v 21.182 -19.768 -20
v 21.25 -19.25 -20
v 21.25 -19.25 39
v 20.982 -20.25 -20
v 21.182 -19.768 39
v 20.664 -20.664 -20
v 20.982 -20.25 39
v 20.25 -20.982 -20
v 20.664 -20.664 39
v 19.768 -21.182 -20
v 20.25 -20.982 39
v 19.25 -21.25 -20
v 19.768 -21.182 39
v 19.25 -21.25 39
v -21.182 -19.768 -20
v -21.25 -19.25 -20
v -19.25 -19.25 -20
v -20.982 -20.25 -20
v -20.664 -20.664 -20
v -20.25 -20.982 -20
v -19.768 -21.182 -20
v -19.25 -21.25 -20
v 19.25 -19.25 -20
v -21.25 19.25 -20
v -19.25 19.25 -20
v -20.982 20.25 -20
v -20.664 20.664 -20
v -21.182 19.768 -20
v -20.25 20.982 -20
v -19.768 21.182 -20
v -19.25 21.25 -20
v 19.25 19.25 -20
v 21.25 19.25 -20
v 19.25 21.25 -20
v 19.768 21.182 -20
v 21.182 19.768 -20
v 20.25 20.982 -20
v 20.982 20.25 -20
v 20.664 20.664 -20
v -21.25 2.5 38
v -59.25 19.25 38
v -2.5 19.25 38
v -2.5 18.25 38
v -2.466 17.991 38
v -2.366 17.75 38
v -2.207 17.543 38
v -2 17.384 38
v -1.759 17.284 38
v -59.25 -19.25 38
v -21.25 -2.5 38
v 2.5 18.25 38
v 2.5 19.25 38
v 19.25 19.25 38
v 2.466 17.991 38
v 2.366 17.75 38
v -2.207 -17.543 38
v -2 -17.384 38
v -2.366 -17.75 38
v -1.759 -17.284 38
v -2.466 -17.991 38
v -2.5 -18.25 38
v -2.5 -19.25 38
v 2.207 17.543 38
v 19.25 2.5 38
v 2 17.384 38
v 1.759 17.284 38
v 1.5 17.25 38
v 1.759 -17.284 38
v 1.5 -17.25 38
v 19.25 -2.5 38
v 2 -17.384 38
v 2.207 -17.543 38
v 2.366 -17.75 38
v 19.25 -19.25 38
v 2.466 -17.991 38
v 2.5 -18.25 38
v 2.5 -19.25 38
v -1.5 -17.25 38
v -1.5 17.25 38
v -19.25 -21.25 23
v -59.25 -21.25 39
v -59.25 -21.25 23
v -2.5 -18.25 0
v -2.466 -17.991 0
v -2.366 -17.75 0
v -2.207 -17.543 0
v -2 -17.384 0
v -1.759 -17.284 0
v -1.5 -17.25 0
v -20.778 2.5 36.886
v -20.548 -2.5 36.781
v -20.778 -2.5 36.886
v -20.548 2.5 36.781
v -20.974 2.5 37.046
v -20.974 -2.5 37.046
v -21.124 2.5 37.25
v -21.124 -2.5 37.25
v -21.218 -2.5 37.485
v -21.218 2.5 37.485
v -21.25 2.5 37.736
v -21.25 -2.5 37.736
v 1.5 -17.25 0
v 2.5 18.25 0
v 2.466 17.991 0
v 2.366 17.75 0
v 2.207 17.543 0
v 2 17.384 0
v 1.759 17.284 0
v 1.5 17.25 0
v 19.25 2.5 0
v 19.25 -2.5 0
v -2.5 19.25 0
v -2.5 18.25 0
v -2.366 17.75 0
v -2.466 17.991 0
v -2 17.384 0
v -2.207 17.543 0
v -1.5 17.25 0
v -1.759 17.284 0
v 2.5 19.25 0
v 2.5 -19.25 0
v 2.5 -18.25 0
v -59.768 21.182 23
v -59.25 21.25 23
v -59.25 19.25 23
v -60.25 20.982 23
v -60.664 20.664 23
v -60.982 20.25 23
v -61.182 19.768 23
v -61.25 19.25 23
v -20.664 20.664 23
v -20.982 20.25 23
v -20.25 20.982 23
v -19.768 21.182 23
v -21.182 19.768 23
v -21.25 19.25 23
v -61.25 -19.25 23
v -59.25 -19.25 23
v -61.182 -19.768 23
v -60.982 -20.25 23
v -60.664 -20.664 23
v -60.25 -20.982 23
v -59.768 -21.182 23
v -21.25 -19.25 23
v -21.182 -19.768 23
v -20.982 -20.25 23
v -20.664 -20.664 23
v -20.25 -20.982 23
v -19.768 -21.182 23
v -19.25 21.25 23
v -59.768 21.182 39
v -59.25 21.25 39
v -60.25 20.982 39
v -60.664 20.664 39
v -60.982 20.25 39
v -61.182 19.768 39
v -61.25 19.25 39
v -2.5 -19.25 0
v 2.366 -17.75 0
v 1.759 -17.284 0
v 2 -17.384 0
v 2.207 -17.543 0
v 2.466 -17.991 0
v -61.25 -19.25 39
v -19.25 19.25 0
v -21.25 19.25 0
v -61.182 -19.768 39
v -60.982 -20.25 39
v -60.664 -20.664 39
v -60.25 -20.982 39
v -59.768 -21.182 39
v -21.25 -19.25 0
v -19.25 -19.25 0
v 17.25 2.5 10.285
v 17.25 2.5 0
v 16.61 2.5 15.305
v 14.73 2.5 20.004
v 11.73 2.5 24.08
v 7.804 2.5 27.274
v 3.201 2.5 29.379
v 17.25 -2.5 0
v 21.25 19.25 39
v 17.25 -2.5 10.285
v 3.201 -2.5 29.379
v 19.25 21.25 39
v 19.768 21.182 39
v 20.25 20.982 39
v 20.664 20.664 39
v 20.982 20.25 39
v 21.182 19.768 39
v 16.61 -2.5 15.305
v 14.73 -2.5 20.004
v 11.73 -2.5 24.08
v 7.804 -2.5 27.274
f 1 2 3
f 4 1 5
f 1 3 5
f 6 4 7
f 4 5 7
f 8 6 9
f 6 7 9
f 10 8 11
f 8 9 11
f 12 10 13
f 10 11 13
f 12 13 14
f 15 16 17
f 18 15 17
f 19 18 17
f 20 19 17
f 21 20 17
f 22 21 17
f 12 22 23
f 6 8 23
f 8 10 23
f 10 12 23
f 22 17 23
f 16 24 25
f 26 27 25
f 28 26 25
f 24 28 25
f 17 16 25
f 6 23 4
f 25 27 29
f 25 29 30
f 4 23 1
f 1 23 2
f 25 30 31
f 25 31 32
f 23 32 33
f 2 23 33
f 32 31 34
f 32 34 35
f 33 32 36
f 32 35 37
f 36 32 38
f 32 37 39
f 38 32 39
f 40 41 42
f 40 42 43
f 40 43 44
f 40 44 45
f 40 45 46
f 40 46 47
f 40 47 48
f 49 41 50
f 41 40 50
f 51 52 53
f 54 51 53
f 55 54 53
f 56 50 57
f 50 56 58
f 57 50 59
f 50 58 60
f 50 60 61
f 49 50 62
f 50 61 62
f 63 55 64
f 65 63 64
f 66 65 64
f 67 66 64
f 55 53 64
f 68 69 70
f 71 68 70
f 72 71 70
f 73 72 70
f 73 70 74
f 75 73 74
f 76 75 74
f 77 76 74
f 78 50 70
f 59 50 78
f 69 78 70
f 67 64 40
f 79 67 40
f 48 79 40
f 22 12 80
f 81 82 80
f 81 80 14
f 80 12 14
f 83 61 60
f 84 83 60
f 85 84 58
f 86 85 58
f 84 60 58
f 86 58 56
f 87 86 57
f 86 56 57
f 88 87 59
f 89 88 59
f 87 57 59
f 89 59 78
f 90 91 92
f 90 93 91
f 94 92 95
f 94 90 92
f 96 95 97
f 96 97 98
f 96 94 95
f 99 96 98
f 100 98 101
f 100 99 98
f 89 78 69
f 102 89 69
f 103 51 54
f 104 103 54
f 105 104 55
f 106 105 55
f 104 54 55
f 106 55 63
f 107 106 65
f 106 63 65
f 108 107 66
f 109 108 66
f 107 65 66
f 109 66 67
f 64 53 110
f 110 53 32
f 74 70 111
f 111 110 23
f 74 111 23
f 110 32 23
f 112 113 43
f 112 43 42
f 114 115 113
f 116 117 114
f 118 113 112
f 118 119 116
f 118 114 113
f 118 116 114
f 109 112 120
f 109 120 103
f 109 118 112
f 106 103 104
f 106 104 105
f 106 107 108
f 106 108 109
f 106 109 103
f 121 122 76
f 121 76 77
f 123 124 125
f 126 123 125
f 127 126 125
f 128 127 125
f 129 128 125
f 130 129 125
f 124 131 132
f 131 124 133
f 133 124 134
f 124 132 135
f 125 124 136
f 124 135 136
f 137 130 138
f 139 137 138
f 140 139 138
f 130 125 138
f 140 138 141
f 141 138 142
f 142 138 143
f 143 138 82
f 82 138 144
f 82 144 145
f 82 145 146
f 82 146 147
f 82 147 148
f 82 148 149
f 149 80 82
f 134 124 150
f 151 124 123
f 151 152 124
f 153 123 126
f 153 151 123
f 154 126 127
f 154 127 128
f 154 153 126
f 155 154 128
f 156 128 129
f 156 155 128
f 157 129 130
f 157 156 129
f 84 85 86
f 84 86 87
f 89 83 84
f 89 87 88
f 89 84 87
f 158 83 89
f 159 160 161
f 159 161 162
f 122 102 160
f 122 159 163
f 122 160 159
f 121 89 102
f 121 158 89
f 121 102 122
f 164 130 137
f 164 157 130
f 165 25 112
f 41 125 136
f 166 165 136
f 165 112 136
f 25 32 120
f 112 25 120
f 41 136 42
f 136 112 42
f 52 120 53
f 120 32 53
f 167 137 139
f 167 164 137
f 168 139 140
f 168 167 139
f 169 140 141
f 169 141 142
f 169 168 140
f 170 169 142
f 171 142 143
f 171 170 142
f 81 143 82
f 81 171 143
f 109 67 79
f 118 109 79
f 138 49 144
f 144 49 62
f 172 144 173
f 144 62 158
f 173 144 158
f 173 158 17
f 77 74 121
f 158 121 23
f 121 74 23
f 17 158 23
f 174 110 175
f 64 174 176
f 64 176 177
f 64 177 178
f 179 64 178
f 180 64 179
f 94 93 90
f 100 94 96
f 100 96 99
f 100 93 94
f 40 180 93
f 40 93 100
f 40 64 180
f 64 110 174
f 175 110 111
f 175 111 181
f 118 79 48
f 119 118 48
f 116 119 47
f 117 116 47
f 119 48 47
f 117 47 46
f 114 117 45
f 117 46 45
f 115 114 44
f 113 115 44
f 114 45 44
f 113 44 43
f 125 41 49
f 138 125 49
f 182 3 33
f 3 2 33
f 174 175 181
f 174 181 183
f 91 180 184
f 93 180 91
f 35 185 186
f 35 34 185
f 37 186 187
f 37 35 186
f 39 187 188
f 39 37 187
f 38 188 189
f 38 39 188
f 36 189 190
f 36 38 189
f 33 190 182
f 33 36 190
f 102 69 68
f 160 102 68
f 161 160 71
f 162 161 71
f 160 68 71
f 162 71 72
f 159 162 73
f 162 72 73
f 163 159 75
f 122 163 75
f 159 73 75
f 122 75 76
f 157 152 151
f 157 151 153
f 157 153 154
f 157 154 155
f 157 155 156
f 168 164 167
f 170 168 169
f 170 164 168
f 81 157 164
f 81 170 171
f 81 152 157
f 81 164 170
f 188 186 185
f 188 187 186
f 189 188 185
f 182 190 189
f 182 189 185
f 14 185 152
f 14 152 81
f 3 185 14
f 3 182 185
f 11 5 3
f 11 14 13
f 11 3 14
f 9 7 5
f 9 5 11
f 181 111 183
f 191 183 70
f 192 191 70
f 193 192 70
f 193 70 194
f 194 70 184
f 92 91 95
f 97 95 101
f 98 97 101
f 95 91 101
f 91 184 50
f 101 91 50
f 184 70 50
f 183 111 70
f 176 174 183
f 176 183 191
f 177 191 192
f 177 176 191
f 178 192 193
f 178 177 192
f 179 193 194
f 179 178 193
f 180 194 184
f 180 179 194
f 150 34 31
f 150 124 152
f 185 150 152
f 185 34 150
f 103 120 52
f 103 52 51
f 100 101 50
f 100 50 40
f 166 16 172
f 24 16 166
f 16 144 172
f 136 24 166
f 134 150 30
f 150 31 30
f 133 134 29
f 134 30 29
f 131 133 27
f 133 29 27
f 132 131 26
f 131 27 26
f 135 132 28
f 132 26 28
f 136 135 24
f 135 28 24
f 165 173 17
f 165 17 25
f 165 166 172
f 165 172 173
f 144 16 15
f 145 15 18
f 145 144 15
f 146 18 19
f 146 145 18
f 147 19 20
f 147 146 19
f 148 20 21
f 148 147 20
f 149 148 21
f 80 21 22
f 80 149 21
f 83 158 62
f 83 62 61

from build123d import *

# Parameters (mm, degrees)
F0_W      = 42.5
F0_H      = 42.5
F0_W_2    = 38.5
F0_H_2    = 38.5
F1_DEPTH  = 20
F3_DEPTH  = 38
F4_W      = 42.5
F4_H      = 42.5
F5_DEPTH  = 1
F9_DEPTH  = 2.5
F11_DEPTH = 38
F12_W     = 42.5
F12_H     = 16
F13_DEPTH = 2
F15_DEPTH = 38
F16_R     = 1.99999


# Not quite as in the source:
# - a fillet or chamfer is up to 0.001 mm smaller than in the source, because OpenCascade refuses the exact size


with BuildPart() as f1:
    # F0 (on Top) → F1 (new body)
    with BuildSketch(Plane.XY):
        Rectangle(F0_W, F0_H)
        Rectangle(F0_W_2, F0_H_2, mode=Mode.SUBTRACT)
    extrude(amount=-F1_DEPTH)

    # F2 (on face) → F3 (join)
    with BuildSketch(Plane.XY):
        Polygon((-21.25, -19.25), (-21.25, -21.25), (21.25, -21.25), (21.25, 21.25), (-21.25, 21.25), (-21.25, 19.25), (-19.25, 19.25), (19.25, 19.25), (19.25, -19.25), (-19.25, -19.25), align=None)
    extrude(amount=F3_DEPTH)

    # F4 (on face) → F5 (join)
    with BuildSketch(Plane.XY.offset(38)):
        Rectangle(F4_W, F4_H)
    extrude(amount=F5_DEPTH)

    # F8 (on plane+point) → F9 (join, symmetric)
    with BuildSketch(Plane(origin=(0, 0, 0), x_dir=(-1, 0, 0), z_dir=(0, 1, 0))):
        with BuildLine():
            Line((21.25, 37.7357607819), (21.25, 38))
            Line((21.25, 38), (-19.25, 38))
            Line((-19.25, 38), (-19.25, 0))
            Line((-19.25, 0), (-17.25, 0))
            Line((-17.25, 0), (-17.25, 10.2847843622))
            ThreePointArc((-17.25, 10.2847843622), (-13.3594316189, 22.1374723659), (-3.2013787085, 29.3787910519))
            Line((-3.2013787085, 29.3787910519), (20.5475689354, 36.7810604474))
            ThreePointArc((20.5475689354, 36.7810604474), (21.0554715809, 37.1431263817), (21.25, 37.7357607819))
        make_face()
    extrude(amount=F9_DEPTH, both=True)

    # F10 (on face) → F11 (join)
    with BuildSketch(Plane(origin=(-21.25, 0, 0), x_dir=(0, -1, 0), z_dir=(-1, 0, 0))):
        Polygon((2.5, 38), (19.25, 38), (19.25, 23), (21.25, 23), (21.25, 39), (-21.25, 39), (-21.25, 23), (-19.25, 23), (-19.25, 38), (-2.5, 38), align=None)
    extrude(amount=F11_DEPTH)

    # F12 (on face) → F13 (join)
    with BuildSketch(Plane(origin=(-59.25, 0, 0), x_dir=(0, -1, 0), z_dir=(-1, 0, 0))):
        with Locations((0, 31)):
            Rectangle(F12_W, F12_H)
    extrude(amount=F13_DEPTH)

    # F14 (on face) → F15 (join, through all)
    with BuildSketch(Plane(origin=(0, 0, 38), x_dir=(1, 0, 0), z_dir=(0, 0, -1))):
        with BuildLine():
            Line((2.5, 18.25), (2.5, 19.25))
            Line((2.5, 19.25), (-2.5, 19.25))
            Line((-2.5, 19.25), (-2.5, 18.25))
            ThreePointArc((-2.5, 18.25), (-2.2071067812, 17.5428932188), (-1.5, 17.25))
            Line((-1.5, 17.25), (1.5, 17.25))
            ThreePointArc((1.5, 17.25), (2.2071067812, 17.5428932188), (2.5, 18.25))
        make_face()
        with BuildLine():
            Line((-2.5, -18.25), (-2.5, -19.25))
            Line((-2.5, -19.25), (2.5, -19.25))
            Line((2.5, -19.25), (2.5, -18.25))
            ThreePointArc((2.5, -18.25), (2.2071067812, -17.5428932188), (1.5, -17.25))
            Line((1.5, -17.25), (-1.5, -17.25))
            ThreePointArc((-1.5, -17.25), (-2.2071067812, -17.5428932188), (-2.5, -18.25))
        make_face()
    extrude(amount=F15_DEPTH)

    # F16 (radius 2 in the source; OpenCascade refuses exactly that, so slightly less here)
    f16_edges = [f1.edges().sort_by_distance(p)[0] for p in [
        (21.25, 21.25, 9.5),
        (-21.25, 21.25, 1.5),
        (-61.25, 21.25, 31),
        (-61.25, -21.25, 31),
        (-21.25, -21.25, 1.5),
        (21.25, -21.25, 9.5),
    ]]
    fillet(f16_edges, radius=F16_R)


solid = f1.part
